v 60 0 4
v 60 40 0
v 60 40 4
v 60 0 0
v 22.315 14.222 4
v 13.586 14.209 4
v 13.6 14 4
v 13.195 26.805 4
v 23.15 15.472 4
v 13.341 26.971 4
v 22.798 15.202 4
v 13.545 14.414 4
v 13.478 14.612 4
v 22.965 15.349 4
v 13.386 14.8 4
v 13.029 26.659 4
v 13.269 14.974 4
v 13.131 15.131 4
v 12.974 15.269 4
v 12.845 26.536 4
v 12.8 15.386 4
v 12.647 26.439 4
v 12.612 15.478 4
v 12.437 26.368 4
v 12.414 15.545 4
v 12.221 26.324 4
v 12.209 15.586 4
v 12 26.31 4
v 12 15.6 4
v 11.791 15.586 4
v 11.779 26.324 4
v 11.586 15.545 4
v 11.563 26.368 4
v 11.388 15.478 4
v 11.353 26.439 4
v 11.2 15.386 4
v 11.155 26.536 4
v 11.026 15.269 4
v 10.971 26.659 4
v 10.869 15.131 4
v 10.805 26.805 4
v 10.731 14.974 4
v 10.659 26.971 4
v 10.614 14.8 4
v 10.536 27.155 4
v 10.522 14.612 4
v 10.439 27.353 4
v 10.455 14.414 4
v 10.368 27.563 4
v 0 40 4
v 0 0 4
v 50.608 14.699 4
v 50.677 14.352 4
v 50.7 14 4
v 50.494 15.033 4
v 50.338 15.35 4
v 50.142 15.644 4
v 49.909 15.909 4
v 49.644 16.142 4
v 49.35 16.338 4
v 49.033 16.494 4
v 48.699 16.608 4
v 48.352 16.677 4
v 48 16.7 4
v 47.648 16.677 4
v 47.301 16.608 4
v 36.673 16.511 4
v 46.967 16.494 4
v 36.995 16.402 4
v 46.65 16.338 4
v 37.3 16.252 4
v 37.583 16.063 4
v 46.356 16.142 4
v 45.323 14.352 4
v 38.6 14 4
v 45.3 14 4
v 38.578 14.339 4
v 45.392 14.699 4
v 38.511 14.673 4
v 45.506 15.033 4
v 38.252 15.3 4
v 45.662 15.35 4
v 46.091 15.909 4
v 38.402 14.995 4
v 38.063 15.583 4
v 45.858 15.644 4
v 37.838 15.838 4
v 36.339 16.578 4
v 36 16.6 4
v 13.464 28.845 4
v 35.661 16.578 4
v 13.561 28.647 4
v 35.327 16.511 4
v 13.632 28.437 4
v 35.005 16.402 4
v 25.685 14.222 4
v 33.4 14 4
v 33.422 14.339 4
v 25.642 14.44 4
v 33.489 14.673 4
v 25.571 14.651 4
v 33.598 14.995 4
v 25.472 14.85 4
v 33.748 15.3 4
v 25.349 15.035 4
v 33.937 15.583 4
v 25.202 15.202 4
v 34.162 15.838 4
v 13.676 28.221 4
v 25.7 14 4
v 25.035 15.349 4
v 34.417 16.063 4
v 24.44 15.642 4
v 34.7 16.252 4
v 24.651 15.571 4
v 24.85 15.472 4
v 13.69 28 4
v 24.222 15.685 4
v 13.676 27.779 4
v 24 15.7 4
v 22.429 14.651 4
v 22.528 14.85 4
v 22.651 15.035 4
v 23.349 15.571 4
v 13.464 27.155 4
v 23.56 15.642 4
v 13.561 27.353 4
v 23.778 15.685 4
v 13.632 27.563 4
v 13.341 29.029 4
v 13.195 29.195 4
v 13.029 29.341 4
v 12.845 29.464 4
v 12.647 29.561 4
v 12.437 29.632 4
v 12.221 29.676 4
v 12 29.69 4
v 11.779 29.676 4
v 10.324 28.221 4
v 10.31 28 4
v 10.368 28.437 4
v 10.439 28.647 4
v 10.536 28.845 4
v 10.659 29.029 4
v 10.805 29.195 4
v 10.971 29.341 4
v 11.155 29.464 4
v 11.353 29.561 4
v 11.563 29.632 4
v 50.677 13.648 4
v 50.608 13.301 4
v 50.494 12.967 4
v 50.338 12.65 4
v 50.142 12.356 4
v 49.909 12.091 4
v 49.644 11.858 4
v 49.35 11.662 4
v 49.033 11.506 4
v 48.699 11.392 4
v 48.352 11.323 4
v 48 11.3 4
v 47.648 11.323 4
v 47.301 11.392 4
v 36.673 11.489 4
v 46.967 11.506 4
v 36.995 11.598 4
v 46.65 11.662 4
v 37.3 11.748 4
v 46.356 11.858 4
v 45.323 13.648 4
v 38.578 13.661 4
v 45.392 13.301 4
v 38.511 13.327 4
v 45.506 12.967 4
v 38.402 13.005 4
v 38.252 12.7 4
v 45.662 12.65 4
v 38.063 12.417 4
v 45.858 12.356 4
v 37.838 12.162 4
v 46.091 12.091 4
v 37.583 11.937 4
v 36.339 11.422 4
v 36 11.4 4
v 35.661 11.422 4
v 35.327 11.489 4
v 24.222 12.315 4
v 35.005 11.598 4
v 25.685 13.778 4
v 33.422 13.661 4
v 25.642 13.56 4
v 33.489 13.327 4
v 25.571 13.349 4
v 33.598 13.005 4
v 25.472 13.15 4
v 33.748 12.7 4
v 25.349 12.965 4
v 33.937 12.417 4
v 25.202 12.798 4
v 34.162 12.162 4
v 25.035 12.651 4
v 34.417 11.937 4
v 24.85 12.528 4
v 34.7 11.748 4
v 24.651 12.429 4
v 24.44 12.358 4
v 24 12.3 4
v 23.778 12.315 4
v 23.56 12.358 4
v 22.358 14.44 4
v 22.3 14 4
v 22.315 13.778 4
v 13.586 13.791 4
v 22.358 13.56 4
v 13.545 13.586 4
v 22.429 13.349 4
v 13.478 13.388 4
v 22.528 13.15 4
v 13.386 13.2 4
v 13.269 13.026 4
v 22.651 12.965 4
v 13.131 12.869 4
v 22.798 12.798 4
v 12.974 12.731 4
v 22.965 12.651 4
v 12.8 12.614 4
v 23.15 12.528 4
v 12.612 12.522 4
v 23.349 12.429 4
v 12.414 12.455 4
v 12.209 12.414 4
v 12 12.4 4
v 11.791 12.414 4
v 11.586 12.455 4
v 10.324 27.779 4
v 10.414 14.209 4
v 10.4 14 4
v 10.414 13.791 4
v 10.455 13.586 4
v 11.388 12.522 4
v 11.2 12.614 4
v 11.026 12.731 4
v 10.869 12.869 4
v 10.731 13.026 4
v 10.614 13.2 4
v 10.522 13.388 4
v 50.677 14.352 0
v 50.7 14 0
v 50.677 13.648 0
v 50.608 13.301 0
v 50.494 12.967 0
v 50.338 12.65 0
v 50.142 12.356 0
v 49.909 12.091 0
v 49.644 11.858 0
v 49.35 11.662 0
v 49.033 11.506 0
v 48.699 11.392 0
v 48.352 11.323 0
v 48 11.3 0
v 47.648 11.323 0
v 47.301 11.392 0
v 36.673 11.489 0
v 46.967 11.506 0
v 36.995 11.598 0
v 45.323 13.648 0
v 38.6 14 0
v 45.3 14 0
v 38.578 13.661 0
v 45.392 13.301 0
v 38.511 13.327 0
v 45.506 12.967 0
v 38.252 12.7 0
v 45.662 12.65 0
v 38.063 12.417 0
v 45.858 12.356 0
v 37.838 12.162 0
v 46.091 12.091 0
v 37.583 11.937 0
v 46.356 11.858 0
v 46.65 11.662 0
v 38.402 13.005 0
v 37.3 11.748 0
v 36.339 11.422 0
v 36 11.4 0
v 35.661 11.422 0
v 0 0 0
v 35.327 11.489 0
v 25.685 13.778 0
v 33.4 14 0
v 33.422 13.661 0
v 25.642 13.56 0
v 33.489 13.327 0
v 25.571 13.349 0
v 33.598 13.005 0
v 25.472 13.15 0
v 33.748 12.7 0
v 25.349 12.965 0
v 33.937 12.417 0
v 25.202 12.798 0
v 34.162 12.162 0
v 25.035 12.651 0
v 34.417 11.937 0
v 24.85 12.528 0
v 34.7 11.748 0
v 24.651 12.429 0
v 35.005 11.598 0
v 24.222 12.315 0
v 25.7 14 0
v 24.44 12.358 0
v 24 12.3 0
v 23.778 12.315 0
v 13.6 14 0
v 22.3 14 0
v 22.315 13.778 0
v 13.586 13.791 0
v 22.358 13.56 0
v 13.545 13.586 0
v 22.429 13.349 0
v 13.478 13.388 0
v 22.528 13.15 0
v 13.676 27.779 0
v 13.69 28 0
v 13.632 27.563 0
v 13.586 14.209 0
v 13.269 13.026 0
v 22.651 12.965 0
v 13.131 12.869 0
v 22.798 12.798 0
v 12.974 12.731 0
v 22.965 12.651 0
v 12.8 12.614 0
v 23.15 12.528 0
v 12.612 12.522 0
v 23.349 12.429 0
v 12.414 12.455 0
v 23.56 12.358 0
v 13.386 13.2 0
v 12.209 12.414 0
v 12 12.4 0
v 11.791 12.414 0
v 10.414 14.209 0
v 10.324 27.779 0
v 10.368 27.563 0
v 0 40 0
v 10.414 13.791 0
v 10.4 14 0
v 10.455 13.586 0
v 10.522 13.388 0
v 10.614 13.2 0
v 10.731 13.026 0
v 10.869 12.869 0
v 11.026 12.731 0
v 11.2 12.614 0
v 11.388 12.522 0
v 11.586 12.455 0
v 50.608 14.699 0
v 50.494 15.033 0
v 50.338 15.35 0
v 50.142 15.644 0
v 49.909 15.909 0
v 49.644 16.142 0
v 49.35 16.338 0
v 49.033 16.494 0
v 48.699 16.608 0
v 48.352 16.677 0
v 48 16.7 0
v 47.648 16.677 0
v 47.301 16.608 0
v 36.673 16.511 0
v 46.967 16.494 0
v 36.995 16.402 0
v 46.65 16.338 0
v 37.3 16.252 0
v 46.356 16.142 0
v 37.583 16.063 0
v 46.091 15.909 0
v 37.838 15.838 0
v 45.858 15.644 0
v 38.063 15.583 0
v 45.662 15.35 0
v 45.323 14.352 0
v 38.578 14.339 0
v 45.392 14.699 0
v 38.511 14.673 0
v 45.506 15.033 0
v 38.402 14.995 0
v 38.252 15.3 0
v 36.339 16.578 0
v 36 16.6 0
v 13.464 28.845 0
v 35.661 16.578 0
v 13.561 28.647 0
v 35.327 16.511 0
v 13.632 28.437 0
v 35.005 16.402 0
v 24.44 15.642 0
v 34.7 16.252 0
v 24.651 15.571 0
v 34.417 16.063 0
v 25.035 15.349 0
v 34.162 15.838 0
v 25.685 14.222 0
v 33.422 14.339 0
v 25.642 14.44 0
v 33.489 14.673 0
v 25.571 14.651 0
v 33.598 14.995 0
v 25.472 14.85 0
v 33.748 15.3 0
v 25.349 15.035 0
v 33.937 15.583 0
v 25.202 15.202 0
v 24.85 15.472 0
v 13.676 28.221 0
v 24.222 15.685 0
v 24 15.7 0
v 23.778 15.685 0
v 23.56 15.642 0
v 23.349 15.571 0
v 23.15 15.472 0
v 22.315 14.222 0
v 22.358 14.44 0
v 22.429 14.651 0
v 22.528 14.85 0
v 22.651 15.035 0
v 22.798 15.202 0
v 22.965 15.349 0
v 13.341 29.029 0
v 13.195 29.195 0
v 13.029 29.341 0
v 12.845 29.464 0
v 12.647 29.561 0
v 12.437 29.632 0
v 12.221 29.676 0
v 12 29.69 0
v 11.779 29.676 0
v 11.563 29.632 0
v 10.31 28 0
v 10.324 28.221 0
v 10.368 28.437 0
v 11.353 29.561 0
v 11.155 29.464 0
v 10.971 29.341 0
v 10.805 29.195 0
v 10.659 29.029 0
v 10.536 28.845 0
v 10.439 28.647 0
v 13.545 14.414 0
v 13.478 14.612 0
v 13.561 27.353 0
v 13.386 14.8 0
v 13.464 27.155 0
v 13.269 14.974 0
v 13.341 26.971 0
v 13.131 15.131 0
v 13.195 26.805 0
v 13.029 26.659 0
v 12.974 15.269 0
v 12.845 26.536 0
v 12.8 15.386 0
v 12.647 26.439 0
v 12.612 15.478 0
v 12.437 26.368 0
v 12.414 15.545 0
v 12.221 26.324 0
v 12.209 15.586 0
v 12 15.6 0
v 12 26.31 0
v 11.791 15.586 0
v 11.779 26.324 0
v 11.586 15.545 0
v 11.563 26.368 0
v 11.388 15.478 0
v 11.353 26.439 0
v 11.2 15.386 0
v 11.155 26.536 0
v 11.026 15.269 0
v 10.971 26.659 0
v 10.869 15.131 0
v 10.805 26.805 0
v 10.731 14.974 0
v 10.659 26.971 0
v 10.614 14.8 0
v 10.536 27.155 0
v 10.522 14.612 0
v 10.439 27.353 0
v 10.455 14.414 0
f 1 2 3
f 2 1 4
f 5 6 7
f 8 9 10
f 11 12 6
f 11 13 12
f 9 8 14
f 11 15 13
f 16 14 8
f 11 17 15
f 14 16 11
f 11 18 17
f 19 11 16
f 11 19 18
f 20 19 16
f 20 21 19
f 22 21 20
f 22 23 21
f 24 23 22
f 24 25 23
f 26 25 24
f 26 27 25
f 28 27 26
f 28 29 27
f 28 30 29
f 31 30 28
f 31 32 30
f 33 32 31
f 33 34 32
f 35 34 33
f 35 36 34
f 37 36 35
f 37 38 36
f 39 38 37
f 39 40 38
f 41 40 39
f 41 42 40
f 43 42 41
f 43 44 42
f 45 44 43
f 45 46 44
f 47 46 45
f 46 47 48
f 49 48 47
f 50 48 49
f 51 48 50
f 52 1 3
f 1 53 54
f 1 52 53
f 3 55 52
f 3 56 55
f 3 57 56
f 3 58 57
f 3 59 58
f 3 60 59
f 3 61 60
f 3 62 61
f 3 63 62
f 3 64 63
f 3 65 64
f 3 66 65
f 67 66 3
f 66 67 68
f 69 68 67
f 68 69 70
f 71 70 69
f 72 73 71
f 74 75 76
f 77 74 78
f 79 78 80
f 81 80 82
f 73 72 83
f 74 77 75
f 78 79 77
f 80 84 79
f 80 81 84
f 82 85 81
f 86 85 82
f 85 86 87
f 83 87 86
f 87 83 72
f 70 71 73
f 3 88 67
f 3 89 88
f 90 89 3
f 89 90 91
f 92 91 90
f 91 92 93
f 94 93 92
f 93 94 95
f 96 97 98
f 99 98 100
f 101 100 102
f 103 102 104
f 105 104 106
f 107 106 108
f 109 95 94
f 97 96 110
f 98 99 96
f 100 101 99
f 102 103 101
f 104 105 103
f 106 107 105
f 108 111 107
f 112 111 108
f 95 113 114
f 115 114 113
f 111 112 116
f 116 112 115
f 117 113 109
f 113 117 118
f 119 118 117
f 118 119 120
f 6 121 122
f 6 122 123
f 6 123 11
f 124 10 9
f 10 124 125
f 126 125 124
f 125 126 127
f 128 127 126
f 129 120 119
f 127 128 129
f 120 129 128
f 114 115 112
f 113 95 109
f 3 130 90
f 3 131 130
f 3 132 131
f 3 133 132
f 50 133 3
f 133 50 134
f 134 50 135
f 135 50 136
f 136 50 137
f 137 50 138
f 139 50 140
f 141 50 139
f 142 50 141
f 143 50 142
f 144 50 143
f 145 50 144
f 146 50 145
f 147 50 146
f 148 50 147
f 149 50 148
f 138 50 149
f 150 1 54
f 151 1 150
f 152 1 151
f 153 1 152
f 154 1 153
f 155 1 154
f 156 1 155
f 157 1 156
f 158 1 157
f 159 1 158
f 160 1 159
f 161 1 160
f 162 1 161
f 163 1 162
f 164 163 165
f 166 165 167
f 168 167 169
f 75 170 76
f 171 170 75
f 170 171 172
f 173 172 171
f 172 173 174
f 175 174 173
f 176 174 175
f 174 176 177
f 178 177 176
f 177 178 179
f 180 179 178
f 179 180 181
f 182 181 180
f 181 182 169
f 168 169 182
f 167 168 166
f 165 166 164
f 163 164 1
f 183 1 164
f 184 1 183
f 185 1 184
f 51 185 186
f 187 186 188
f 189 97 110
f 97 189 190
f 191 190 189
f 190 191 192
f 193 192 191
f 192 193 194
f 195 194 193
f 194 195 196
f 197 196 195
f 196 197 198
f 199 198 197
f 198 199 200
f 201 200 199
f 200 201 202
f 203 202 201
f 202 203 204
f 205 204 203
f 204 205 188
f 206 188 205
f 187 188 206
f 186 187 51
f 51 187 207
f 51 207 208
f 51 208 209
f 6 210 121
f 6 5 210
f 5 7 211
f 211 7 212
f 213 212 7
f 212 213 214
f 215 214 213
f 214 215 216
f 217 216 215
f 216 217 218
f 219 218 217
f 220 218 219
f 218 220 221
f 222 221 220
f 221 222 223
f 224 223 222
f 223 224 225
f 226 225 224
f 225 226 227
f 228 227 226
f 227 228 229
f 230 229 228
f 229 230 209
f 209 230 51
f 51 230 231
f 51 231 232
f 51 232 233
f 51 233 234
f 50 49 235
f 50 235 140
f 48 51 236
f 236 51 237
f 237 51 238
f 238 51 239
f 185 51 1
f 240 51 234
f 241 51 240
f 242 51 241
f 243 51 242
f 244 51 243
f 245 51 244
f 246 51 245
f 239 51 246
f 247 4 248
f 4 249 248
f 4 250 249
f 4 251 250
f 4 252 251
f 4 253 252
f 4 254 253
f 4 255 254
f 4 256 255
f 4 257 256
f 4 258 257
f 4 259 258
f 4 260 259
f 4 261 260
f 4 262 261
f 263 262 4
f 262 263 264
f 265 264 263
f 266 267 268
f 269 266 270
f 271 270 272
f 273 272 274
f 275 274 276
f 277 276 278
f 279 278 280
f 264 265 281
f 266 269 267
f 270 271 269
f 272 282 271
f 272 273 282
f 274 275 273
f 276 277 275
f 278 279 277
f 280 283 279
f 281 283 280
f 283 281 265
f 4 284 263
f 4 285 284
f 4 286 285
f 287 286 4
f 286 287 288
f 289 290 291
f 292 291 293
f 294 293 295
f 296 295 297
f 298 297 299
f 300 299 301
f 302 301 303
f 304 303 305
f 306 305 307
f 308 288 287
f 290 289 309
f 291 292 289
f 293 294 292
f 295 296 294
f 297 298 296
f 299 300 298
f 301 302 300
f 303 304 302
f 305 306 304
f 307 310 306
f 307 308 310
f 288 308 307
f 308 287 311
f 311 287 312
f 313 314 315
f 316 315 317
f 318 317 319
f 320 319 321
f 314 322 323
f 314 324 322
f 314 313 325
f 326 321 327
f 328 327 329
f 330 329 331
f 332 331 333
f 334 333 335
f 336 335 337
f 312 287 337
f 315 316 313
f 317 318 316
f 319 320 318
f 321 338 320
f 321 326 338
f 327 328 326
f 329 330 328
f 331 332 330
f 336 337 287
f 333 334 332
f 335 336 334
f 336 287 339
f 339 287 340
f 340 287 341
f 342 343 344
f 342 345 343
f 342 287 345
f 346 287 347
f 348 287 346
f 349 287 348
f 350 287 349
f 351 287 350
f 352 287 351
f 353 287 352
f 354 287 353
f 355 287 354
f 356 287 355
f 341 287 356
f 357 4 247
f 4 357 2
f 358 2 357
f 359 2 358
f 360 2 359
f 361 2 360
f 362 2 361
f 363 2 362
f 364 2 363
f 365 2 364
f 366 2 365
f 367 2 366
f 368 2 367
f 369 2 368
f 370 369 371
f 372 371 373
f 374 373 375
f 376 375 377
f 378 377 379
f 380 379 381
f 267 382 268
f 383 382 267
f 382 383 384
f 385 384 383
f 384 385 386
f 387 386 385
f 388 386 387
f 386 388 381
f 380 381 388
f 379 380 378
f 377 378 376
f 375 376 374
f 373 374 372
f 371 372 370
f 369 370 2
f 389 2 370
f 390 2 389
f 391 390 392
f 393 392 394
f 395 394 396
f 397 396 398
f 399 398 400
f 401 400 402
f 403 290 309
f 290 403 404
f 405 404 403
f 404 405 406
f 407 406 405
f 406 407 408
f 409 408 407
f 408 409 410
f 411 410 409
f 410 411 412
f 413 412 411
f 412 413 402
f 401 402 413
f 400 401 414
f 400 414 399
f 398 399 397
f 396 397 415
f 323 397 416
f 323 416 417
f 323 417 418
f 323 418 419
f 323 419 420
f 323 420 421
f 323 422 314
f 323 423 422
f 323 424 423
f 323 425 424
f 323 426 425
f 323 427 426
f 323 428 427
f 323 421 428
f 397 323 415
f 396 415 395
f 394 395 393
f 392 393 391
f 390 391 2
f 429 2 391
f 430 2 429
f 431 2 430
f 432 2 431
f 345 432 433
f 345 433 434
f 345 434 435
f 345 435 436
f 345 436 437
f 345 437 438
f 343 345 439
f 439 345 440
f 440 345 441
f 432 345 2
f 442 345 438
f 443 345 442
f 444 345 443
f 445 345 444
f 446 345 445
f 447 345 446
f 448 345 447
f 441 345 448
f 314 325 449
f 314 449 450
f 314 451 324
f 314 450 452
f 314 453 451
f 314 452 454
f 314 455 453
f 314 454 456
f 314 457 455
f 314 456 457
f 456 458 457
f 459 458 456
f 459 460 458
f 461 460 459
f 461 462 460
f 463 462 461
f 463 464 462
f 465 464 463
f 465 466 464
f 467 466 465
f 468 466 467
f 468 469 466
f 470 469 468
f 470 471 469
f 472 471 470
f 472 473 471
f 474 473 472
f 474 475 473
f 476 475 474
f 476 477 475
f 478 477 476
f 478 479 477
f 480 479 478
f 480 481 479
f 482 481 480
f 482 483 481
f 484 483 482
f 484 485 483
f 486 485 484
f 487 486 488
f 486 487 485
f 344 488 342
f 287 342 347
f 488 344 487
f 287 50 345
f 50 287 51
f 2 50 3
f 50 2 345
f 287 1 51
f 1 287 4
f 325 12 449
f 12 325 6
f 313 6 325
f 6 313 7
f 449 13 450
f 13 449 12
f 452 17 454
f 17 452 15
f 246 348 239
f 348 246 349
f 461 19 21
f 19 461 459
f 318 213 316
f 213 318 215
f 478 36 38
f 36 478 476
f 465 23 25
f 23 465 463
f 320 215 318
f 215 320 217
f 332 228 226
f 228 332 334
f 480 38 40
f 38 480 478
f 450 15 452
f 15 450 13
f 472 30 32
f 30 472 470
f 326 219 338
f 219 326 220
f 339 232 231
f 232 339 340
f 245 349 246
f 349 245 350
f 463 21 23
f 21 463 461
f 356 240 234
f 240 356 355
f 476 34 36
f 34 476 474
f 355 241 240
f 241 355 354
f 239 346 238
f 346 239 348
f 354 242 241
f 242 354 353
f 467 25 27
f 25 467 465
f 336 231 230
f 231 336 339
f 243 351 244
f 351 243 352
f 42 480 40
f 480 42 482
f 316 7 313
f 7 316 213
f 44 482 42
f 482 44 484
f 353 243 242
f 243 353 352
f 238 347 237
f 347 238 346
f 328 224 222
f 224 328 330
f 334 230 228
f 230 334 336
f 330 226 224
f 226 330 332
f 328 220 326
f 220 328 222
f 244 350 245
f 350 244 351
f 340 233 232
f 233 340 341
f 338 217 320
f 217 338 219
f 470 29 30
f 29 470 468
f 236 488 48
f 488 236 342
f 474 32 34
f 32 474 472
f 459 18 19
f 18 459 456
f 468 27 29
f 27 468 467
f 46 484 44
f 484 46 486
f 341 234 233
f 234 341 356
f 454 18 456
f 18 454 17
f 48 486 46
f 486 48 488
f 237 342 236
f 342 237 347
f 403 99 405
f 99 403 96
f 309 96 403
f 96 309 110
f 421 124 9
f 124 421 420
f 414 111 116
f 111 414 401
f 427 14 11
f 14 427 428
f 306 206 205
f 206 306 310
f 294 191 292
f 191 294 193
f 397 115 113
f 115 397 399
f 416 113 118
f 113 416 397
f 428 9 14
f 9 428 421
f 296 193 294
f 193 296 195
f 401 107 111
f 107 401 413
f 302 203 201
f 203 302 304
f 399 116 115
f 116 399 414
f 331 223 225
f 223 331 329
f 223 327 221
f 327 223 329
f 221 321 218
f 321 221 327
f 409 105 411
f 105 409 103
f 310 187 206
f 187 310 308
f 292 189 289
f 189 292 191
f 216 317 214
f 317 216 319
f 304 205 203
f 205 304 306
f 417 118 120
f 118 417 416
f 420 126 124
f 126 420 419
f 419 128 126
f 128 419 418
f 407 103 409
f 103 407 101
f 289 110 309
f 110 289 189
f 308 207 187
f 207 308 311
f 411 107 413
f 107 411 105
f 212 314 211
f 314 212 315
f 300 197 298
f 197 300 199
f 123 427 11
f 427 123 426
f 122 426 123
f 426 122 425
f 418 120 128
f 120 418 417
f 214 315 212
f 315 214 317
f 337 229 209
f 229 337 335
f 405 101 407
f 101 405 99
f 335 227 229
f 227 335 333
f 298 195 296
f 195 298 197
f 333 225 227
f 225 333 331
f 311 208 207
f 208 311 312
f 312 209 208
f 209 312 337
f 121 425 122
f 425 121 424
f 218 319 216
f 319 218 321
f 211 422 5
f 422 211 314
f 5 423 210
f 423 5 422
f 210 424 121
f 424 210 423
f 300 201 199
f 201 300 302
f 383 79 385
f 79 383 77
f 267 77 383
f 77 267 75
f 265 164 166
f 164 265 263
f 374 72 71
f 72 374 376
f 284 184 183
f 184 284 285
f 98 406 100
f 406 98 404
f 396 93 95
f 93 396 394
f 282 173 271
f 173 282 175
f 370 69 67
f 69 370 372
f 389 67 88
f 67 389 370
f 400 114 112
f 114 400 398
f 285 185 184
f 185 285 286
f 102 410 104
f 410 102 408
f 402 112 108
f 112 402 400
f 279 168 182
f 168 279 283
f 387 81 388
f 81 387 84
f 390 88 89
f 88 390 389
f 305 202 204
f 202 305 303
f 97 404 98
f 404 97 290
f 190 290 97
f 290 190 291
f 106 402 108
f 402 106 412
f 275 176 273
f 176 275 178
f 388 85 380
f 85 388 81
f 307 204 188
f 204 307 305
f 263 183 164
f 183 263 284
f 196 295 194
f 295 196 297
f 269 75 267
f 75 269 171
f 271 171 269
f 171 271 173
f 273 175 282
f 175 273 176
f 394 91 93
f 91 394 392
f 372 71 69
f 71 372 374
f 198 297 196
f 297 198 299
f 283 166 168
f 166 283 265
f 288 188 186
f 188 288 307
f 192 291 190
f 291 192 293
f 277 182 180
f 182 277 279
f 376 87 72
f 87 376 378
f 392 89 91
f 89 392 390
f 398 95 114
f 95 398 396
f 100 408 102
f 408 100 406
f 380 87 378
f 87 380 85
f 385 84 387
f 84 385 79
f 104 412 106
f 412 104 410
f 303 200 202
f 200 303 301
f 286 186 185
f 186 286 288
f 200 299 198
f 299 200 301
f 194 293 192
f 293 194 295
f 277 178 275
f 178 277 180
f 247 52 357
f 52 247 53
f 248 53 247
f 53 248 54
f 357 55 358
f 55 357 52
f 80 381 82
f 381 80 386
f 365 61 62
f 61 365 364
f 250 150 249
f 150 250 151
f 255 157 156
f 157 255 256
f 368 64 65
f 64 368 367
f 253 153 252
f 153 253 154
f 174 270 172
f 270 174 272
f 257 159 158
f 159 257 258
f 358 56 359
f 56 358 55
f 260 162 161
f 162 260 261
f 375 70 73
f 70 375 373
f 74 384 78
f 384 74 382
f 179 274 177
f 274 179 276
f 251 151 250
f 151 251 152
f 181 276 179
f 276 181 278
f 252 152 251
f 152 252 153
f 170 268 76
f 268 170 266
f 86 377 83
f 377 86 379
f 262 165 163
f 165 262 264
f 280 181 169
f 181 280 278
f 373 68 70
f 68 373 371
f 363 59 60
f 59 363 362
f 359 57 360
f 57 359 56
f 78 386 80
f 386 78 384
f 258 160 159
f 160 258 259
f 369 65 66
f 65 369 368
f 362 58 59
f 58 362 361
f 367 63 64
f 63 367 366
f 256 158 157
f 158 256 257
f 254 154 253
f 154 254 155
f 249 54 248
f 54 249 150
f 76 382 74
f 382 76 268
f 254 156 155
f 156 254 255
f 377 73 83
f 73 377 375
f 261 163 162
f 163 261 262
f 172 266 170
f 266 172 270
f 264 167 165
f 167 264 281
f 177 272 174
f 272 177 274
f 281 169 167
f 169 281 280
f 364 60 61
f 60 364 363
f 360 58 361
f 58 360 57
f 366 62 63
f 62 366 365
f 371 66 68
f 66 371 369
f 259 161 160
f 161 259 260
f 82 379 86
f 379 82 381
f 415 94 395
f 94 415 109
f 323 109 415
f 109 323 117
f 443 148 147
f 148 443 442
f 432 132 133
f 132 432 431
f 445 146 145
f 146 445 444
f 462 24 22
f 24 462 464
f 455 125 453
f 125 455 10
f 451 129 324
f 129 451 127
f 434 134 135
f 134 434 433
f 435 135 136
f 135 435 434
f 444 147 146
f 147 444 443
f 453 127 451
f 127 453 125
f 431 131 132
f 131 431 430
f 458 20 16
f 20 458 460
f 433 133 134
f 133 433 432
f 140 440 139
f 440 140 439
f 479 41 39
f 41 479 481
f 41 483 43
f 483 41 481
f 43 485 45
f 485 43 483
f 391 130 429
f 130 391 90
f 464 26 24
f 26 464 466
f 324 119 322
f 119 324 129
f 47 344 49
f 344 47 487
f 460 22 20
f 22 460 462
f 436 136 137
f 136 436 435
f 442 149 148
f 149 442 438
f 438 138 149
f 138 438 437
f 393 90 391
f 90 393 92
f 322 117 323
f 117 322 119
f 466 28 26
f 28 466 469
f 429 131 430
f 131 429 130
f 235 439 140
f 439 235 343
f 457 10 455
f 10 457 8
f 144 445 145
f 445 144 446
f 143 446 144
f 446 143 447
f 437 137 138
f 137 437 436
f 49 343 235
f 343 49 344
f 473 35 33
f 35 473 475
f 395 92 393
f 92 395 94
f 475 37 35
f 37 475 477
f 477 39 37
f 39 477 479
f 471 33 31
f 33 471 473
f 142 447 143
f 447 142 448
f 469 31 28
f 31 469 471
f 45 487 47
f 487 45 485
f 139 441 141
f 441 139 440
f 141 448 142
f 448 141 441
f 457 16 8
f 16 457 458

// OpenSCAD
// file: parameters.scad
// {{NAME}} — shared fit numbers. OpenSCAD 2021.
//
// X-Y hole compensation in the slicer stays off. Every allowance is here.
//
// fit_slip is the gap per side between two printed parts. 0.125 mm per
// side (0.25 mm on the diameter) is a conservative starting clearance
// for a 0.4 mm nozzle. It is not a measurement from a particular
// printer. Printed-to-printed pairs do not get hole_comp: both sides
// shrink together. Print the fit coupon and replace this number.
//
// hole_comp is diametral, on a female feature that mates with metal or
// a hard gauge. A common 0.4 mm nozzle prints holes about 0.15–0.2 mm
// small. 0.18 mm is a placeholder inside that band. The fit coupon is
// what changes it: measure a labeled hole and set hole_comp to
// (CAD diameter − measured diameter), then re-export.
//
// Press, free, and loose are diametral. fit_slip is per side.

fit_press = 0.12;   // diametral interference
fit_slip = 0.125;   // per side. Printed-to-printed default.
fit_free = 0.45;    // diametral, free running or sliding
fit_loose = 0.55;   // diametral, locate then clamp
hole_comp = 0.18;   // diametral. Inside the 0.15–0.2 mm X1C band.
// main file
// Fit coupon for the Bambu X1C. Bed at z = 0. One STL per part.
//
//   openscad -o stl/fit_coupon_holes.stl -D 'part="holes"' fit_coupon.scad
//   openscad -o stl/fit_coupon_fits.stl -D 'part="fits"' fit_coupon.scad
//
// holes: through holes at the CAD size, plus one hole that already
// includes hole_comp, so a caliper shows how small the printer went.
// No lead-in.
//
// fits: three slots for a 10 mm printed male. The widths are
// 10 + 2 * clearance, at 0.10, fit_slip (0.125), and 0.15 per side.
// 0.125 is the part-to-part default.
//
// Print both at 2 walls, 2 shells, 15% gyroid. PETG, 0.4 mm nozzle, 0.2 mm.
include <parameters.scad>

part = "holes"; // holes | fits

module holes() {
    difference() {
        cube([60, 40, 4]);
        translate([12, 14, -1]) cylinder(h = 6, d = 3.2, $fn = 48);
        translate([24, 14, -1]) cylinder(h = 6, d = 3.4, $fn = 48);
        translate([36, 14, -1]) cylinder(h = 6, d = 5.2, $fn = 48);
        translate([48, 14, -1]) cylinder(h = 6, d = 5.4, $fn = 48);
        translate([12, 28, -1]) cylinder(h = 6, d = 3.2 + hole_comp, $fn = 48);
    }
}

module fits() {
    difference() {
        cube([56, 28, 6]);
        translate([4, 6, -1]) cube([10 + 2 * 0.10, 16, 8]);
        translate([18, 6, -1]) cube([10 + 2 * fit_slip, 16, 8]);
        translate([32, 6, -1]) cube([10 + 2 * 0.15, 16, 8]);
    }
}

if (part == "holes") holes();
if (part == "fits") fits();
